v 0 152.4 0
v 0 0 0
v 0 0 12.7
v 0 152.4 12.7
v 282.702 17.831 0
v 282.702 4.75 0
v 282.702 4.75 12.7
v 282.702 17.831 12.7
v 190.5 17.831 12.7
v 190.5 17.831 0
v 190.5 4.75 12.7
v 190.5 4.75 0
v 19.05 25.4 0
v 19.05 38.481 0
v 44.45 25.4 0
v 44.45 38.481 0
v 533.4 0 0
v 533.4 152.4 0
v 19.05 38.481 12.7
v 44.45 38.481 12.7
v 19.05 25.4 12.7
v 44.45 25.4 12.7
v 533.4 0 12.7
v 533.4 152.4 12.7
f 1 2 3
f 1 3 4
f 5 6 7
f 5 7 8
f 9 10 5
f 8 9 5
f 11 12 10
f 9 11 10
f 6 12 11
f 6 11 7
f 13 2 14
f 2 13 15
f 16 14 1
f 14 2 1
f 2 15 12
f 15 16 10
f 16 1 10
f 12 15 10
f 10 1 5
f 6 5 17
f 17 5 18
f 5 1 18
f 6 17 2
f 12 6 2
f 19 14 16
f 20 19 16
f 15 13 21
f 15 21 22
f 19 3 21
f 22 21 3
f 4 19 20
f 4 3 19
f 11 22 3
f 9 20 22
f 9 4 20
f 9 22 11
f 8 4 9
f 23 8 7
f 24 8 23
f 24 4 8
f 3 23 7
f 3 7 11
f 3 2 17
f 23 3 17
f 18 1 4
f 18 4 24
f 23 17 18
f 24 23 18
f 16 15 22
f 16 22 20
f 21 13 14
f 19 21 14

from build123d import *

# Parameters (mm, degrees)
SKETCH1_W           = 533.4
SKETCH1_H           = 152.4
BOSS_EXTRUDE1_DEPTH = 12.7
SKETCH2_W           = 25.4
SKETCH2_H           = 13.081
CUT_EXTRUDE1_DEPTH  = 555.889727784
SKETCH3_W           = 92.202
SKETCH3_H           = 13.081
CUT_EXTRUDE2_DEPTH  = 555.889727784


with BuildPart() as part:
    # Sketch1 → Boss-Extrude1 (new body)
    with BuildSketch(Plane.XY):
        with Locations((266.7, 76.2)):
            Rectangle(SKETCH1_W, SKETCH1_H)
    extrude(amount=BOSS_EXTRUDE1_DEPTH)

    # Sketch2 → Cut-Extrude1 (cut, through all)
    with BuildSketch(Plane.XY):
        with Locations((31.75, 31.9405)):
            Rectangle(SKETCH2_W, SKETCH2_H)
    extrude(amount=CUT_EXTRUDE1_DEPTH, mode=Mode.SUBTRACT)

    # Sketch3 → Cut-Extrude2 (cut, through all)
    with BuildSketch(Plane.XY):
        with Locations((236.601, 11.2903)):
            Rectangle(SKETCH3_W, SKETCH3_H)
    extrude(amount=CUT_EXTRUDE2_DEPTH, mode=Mode.SUBTRACT)


solid = part.part
